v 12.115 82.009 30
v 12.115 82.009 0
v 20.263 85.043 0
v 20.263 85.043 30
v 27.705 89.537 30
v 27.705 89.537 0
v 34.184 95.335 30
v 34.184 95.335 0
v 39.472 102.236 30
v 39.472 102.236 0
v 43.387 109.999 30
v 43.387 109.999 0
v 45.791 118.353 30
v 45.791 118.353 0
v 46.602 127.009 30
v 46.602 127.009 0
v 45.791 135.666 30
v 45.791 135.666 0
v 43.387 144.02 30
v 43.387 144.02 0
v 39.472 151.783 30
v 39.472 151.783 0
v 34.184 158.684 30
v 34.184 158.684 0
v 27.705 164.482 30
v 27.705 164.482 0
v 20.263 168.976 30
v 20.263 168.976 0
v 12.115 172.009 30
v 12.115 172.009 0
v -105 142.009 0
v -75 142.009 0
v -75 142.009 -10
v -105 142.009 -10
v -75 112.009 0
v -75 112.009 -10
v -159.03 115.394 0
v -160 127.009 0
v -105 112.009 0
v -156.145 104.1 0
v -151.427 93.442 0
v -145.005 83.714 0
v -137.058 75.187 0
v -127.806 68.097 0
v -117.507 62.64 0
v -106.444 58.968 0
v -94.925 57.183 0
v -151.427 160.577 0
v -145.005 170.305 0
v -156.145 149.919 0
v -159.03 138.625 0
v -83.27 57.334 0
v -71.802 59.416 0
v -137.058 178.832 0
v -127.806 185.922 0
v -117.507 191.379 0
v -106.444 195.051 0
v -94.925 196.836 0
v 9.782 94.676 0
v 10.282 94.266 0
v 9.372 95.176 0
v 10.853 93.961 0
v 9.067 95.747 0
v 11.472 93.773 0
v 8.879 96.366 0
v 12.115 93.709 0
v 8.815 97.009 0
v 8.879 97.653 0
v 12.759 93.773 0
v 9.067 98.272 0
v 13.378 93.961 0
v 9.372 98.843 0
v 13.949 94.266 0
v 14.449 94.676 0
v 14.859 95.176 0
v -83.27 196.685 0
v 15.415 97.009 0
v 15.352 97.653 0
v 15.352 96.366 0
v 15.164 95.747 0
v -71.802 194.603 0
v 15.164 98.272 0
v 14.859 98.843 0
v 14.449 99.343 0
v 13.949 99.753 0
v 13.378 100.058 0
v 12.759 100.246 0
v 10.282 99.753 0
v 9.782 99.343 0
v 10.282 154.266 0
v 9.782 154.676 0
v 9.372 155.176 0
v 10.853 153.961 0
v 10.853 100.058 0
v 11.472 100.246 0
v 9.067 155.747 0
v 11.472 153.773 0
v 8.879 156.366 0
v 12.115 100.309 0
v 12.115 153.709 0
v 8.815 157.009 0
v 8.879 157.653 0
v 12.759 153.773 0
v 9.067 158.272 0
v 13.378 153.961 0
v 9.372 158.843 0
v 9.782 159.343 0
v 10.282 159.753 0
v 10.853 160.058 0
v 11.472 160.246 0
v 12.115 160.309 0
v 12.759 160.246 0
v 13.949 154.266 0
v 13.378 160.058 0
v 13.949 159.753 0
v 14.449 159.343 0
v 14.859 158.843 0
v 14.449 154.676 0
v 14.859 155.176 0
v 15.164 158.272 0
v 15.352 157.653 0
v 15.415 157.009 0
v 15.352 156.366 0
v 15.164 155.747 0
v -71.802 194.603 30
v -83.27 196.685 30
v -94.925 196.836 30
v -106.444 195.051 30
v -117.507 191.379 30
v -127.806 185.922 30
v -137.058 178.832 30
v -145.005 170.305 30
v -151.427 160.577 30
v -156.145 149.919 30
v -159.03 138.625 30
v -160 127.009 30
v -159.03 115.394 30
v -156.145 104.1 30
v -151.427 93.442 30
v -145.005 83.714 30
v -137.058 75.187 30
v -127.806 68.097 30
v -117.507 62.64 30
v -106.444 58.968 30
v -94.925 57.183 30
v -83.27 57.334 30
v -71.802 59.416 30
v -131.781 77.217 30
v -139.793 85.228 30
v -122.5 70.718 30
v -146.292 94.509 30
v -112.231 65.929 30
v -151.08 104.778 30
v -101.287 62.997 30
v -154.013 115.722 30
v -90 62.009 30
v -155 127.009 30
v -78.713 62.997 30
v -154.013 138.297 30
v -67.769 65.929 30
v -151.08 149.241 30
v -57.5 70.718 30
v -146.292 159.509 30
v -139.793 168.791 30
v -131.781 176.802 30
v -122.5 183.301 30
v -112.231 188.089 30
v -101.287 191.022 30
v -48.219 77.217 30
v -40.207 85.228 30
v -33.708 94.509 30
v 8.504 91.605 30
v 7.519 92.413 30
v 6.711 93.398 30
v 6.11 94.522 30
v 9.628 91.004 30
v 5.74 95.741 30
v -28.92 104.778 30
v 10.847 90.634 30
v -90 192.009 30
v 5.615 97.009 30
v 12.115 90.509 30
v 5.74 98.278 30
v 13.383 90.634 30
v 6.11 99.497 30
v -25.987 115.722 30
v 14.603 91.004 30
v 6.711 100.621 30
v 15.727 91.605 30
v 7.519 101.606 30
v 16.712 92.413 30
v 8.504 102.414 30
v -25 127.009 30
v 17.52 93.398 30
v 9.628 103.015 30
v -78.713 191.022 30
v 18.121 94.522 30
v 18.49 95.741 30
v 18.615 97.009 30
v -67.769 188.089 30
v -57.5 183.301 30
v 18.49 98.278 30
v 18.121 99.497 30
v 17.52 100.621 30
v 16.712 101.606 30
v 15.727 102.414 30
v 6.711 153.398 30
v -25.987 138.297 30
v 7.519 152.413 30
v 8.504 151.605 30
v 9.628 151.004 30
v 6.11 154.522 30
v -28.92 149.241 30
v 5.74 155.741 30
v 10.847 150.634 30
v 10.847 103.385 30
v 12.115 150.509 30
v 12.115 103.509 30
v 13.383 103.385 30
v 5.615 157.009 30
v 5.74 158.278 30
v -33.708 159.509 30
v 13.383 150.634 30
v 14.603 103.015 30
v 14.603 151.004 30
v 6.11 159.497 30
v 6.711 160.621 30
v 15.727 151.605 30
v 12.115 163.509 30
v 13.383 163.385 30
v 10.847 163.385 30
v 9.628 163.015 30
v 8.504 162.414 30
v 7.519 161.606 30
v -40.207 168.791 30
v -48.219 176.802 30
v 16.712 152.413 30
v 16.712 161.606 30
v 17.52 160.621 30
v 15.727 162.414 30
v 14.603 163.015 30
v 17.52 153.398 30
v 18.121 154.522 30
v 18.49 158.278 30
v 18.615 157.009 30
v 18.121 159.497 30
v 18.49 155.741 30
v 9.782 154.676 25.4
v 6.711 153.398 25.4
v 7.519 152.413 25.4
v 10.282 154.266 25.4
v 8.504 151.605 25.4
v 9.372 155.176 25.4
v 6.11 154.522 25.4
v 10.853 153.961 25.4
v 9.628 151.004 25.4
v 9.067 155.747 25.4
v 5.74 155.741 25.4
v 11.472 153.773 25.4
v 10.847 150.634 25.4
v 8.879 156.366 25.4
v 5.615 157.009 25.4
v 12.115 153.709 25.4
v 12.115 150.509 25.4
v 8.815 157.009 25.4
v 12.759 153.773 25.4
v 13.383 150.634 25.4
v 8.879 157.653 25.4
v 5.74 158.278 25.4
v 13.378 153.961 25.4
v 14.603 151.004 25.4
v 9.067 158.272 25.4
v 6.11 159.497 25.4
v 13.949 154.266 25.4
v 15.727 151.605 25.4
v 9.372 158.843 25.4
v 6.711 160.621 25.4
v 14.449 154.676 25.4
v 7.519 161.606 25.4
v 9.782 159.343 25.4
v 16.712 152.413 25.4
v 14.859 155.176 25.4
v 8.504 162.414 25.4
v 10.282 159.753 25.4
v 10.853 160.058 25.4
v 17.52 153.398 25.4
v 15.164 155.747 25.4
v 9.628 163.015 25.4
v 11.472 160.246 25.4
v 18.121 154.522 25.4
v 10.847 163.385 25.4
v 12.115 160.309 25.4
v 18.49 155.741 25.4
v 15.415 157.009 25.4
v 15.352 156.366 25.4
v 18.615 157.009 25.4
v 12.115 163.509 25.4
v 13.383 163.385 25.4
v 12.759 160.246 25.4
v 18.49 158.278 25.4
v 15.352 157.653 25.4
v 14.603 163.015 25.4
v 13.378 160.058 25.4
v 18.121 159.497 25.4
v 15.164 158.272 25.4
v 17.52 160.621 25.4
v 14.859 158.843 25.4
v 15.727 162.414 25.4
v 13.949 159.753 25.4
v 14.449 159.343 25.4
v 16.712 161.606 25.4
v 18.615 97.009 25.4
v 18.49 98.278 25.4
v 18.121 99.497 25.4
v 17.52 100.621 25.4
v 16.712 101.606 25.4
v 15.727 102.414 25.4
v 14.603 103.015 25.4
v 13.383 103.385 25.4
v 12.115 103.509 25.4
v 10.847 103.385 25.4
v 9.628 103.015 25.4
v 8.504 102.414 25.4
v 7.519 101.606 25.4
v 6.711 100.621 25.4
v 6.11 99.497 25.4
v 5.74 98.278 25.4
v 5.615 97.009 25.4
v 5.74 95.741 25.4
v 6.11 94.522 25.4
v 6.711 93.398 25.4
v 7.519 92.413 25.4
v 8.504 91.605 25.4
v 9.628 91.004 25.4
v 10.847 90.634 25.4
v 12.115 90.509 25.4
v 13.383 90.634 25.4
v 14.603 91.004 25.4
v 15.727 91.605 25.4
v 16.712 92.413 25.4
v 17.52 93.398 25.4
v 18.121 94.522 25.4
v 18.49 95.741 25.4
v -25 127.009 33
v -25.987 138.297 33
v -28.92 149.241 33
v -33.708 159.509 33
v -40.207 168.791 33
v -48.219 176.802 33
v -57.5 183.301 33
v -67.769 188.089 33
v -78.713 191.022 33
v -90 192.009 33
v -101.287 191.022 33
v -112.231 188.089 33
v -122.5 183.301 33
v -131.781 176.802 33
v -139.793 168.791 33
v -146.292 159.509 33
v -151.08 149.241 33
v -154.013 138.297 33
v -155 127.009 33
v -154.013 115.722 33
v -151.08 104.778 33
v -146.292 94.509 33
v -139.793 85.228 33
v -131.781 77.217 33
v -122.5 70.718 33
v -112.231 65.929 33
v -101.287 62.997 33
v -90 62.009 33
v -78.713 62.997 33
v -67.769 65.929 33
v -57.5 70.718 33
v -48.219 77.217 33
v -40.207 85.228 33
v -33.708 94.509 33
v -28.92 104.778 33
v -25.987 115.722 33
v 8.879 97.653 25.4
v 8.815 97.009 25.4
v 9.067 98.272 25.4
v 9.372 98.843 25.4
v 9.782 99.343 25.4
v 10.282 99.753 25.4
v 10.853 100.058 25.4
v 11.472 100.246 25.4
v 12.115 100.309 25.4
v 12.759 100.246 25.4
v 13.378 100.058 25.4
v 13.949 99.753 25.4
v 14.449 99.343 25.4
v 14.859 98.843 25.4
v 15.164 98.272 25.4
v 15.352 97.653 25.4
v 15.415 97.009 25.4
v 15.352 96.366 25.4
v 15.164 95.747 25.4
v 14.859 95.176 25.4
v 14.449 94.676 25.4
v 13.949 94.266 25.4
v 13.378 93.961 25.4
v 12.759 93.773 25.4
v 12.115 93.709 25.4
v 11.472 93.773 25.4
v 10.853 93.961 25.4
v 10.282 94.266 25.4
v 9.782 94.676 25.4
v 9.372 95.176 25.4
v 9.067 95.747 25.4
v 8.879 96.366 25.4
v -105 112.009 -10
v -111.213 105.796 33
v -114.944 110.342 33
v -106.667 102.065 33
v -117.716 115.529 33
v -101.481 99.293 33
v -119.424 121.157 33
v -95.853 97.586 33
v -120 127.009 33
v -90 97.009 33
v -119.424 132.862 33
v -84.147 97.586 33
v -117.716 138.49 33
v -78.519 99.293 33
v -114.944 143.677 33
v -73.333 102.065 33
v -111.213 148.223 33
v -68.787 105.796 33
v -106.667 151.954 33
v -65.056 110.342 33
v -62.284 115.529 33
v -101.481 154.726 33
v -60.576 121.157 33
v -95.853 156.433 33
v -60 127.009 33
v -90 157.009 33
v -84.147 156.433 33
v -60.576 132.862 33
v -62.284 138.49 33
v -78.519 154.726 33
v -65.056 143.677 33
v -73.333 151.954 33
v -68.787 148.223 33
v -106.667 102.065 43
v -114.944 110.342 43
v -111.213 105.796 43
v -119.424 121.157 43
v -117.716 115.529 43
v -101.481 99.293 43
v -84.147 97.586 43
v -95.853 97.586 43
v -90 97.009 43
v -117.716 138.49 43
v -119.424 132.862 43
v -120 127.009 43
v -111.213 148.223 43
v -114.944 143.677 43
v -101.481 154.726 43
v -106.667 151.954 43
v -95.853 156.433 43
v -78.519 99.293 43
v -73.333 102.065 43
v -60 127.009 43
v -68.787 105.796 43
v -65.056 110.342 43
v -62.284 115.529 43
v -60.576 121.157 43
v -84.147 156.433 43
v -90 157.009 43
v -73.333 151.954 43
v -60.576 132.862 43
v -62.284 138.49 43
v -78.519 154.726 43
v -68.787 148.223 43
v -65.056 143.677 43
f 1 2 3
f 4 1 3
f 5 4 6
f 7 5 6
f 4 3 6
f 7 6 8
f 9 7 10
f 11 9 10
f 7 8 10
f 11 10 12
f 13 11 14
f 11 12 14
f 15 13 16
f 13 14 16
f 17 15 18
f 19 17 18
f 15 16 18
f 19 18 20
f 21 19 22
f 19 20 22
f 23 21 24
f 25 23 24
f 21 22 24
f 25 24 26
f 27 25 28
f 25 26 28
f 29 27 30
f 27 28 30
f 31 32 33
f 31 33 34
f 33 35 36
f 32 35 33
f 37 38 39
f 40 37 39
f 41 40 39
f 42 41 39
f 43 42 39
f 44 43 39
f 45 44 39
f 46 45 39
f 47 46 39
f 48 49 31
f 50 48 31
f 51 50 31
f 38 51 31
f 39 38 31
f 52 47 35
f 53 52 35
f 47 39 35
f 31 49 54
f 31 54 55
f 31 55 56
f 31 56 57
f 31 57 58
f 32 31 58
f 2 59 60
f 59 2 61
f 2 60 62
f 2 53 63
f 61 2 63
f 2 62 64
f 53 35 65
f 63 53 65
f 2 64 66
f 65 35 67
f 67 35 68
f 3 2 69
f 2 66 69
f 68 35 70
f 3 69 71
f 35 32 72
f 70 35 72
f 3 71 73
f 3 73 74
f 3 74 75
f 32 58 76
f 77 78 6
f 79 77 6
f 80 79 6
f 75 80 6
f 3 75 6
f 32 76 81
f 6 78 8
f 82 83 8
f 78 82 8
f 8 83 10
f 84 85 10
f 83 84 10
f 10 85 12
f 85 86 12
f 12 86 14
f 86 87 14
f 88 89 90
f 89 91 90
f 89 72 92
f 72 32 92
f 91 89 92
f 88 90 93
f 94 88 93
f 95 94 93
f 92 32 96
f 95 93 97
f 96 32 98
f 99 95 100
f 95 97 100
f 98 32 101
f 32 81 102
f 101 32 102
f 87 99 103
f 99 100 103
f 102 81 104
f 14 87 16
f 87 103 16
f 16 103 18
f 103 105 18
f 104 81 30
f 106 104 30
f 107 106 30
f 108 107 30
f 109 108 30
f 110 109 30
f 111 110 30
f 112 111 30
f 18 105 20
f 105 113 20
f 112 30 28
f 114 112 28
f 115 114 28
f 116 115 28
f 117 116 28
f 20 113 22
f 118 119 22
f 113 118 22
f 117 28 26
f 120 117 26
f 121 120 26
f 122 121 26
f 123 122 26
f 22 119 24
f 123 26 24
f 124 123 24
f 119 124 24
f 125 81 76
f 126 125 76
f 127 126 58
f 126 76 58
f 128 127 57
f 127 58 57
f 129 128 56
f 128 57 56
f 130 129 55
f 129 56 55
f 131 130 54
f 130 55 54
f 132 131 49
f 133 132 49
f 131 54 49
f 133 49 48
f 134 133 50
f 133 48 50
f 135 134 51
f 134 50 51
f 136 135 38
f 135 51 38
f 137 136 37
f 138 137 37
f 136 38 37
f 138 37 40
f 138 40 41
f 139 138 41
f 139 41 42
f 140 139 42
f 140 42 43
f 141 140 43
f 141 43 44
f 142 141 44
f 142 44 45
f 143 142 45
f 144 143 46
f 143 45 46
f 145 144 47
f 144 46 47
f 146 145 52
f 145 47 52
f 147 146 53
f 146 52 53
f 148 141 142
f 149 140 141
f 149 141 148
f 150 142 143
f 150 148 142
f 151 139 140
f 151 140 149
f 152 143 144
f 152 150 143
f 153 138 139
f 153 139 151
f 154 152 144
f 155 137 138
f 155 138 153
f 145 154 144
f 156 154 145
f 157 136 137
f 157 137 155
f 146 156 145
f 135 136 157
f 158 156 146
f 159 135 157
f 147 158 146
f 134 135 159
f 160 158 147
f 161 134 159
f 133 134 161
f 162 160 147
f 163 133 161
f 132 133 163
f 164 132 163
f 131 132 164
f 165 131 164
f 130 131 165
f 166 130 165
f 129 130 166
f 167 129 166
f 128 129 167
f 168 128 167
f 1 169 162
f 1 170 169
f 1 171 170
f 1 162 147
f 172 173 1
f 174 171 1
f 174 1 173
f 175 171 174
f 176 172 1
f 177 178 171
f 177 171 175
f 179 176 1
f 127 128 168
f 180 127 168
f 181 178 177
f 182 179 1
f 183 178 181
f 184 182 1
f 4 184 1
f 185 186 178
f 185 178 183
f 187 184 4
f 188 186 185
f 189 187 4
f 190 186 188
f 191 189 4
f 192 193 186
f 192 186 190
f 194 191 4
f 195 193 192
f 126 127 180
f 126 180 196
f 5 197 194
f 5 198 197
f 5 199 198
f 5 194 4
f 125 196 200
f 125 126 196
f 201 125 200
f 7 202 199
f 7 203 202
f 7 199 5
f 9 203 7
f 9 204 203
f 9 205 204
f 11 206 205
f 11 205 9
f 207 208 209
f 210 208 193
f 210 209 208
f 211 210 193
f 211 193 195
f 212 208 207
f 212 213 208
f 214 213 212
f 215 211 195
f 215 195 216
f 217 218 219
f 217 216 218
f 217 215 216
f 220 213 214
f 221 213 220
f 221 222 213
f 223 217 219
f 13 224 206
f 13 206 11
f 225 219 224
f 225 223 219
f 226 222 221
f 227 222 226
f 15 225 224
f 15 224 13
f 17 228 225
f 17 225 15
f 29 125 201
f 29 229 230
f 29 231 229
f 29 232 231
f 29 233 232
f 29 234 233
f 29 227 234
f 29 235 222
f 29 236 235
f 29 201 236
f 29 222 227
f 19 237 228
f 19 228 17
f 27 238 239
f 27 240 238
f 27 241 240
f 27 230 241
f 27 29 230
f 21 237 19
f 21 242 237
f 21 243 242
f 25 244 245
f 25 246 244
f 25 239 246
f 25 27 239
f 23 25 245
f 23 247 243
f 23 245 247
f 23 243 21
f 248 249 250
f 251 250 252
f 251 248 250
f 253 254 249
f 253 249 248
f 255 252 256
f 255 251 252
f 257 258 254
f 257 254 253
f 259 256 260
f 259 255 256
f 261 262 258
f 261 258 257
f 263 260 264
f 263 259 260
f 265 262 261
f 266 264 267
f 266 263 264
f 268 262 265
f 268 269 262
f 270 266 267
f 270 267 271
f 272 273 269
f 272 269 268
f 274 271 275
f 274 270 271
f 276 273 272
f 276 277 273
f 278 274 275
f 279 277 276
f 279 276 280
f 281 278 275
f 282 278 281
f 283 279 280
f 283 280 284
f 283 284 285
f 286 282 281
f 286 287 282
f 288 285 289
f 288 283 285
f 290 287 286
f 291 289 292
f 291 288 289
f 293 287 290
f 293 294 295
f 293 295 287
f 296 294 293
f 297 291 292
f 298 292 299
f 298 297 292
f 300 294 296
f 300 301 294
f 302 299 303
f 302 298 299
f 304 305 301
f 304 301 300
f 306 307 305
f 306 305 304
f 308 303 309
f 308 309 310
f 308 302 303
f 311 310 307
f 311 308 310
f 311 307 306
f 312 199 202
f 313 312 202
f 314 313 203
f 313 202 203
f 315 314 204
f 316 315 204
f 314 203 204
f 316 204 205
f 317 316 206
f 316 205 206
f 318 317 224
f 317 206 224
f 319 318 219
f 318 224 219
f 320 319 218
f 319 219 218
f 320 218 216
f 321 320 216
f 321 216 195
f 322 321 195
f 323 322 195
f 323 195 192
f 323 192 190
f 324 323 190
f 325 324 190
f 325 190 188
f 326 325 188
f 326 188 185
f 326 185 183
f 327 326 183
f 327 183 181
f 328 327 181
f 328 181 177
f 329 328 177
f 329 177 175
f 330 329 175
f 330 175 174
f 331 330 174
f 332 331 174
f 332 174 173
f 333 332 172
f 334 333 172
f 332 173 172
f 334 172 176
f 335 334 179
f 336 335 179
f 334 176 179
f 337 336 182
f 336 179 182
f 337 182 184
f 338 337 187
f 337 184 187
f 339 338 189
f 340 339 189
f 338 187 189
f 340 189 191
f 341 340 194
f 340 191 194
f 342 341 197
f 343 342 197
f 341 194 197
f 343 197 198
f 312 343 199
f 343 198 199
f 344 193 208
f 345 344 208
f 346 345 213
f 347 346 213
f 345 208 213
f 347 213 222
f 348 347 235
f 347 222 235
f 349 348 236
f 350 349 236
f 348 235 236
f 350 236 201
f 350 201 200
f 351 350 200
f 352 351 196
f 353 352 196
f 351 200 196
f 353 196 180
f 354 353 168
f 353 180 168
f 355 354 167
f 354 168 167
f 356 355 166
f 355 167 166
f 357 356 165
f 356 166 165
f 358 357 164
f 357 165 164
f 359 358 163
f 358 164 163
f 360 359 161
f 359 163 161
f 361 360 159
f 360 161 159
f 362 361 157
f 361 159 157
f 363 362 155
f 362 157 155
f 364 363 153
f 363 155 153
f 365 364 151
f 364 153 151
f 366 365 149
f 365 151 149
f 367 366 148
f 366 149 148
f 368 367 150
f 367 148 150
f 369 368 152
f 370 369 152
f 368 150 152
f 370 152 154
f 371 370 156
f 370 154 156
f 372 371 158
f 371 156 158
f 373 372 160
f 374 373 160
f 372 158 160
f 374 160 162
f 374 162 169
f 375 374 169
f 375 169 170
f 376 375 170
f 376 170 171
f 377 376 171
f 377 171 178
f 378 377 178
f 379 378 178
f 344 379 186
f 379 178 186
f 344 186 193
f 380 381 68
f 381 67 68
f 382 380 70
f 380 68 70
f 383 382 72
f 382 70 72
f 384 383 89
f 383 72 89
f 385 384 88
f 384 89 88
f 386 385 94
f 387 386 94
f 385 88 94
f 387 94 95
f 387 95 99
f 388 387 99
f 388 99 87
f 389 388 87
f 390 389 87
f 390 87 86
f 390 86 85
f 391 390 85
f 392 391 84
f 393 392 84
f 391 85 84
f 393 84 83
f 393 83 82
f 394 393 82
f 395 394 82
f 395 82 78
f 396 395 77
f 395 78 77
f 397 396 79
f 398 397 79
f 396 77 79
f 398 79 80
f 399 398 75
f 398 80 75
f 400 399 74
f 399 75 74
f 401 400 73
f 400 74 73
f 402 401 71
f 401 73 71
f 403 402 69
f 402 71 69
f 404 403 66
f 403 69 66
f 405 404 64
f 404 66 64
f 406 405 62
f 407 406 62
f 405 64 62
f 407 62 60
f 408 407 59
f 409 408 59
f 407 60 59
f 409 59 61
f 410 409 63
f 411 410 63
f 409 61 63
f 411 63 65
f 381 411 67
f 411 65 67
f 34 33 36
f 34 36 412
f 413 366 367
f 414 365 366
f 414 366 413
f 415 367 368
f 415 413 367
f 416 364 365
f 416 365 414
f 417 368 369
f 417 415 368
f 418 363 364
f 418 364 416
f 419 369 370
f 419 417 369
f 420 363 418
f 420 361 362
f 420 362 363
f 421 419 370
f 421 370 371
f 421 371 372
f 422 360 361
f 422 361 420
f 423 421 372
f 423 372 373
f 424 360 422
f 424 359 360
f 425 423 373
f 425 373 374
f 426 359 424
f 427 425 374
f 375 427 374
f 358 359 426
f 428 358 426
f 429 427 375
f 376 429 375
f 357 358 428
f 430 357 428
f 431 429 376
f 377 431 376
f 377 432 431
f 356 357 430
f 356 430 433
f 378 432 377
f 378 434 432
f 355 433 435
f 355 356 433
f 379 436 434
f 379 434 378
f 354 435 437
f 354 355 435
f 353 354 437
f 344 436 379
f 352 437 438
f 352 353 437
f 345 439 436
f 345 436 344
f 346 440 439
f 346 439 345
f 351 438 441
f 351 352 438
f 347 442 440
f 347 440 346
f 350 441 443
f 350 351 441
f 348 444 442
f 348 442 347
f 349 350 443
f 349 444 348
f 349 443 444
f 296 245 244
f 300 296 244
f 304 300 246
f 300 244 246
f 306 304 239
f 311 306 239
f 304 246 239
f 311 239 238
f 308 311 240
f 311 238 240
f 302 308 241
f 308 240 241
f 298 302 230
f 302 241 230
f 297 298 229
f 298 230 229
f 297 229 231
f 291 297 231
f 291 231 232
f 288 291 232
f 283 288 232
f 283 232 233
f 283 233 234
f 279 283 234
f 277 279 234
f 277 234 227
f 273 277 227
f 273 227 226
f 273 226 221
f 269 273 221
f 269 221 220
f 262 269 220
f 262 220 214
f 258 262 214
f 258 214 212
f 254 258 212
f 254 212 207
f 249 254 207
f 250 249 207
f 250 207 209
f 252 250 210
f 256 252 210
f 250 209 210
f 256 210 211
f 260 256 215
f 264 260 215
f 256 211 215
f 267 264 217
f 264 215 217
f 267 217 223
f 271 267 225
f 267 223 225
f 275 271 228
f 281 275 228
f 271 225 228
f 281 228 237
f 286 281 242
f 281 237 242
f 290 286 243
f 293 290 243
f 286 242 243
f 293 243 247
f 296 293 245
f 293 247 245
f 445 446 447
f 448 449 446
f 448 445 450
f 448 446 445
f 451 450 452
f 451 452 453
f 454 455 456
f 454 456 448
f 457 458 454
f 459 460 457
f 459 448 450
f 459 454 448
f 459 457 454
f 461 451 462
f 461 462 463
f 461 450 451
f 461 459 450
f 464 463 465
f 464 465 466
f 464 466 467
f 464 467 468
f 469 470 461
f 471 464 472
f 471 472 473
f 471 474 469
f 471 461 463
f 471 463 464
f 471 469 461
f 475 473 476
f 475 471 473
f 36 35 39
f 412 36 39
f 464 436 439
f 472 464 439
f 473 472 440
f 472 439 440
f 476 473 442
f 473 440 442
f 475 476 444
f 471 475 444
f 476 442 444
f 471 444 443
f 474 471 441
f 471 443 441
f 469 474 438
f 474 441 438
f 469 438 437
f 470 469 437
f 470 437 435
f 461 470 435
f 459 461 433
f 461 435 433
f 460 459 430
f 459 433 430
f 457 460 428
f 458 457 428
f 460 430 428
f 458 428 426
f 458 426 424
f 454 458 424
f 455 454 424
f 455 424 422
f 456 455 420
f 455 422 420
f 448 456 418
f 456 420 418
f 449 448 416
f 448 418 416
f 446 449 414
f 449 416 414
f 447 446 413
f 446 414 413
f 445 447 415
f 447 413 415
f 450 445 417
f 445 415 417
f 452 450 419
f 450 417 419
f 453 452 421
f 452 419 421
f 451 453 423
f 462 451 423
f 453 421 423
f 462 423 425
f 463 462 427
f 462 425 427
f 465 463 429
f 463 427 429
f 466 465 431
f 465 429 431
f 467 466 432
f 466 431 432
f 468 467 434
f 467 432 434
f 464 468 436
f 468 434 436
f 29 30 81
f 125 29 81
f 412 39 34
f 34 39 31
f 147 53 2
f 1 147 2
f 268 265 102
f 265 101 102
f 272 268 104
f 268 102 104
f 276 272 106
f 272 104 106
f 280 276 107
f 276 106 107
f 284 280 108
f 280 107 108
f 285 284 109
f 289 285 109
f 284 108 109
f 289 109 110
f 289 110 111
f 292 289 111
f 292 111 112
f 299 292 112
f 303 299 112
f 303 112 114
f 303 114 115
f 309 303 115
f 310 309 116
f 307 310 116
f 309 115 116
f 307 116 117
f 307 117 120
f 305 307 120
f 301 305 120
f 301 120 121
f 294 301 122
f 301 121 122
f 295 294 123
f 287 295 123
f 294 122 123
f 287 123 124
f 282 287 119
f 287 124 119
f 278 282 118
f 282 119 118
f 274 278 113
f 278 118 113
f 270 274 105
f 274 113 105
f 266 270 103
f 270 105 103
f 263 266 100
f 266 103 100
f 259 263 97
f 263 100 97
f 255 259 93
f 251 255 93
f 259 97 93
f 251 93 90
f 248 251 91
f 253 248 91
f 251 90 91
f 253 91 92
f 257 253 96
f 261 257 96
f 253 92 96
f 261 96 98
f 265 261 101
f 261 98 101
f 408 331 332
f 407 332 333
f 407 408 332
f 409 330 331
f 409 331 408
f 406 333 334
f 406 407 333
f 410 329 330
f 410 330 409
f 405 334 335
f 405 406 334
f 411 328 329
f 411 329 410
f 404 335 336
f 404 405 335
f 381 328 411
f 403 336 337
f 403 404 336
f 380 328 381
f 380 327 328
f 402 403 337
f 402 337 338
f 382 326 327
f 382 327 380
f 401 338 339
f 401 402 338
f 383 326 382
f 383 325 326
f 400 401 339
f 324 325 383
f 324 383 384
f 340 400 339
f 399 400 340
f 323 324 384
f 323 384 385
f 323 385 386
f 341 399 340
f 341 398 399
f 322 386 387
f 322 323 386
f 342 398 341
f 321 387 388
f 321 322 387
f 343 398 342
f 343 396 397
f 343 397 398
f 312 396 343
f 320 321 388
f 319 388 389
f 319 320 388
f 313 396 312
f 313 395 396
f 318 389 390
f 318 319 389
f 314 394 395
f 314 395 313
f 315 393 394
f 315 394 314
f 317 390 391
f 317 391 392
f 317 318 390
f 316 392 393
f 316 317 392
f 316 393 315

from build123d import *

# Parameters (mm, degrees)
BOSS_EXTRUDE1_DEPTH                      = 30
SKETCH2_W                                = 30
SKETCH2_H                                = 30
BOSS_EXTRUDE2_DEPTH                      = 10
SKETCH3_R                                = 65
BOSS_EXTRUDE3_DEPTH                      = 3
SKETCH4_R                                = 30
BOSS_EXTRUDE4_DEPTH                      = 10
CBORE_FOR_M6_PAN_HEAD_SCREW1_D           = 6.6
CBORE_FOR_M6_PAN_HEAD_SCREW1_DEPTH       = 50.5
CBORE_FOR_M6_PAN_HEAD_SCREW1_CBORE_D     = 13
CBORE_FOR_M6_PAN_HEAD_SCREW1_CBORE_DEPTH = 4.6
CBORE_FOR_M6_PAN_HEAD_SCREW1_TIP         = 1.982840043


with BuildPart() as part:
    # Sketch1 → Boss-Extrude1 (new body)
    with BuildSketch(Plane.XY):
        with BuildLine():
            Line((12.115384439, 172.009473486), (-71.801857106, 194.602576649))
            ThreePointArc((-71.801857106, 194.602576649), (-160, 127.009473486), (-71.801857106, 59.416370323))
            Line((-71.801857106, 59.416370323), (12.115384439, 82.009473486))
            ThreePointArc((12.115384439, 82.009473486), (46.602387708, 127.009473486), (12.115384439, 172.009473486))
        make_face()
    extrude(amount=BOSS_EXTRUDE1_DEPTH)

    # Sketch2 → Boss-Extrude2 (add)
    with BuildSketch(Plane(origin=(0, 0, 0), x_dir=(-1, 0, 0), z_dir=(0, 0, -1))):
        with Locations((90, 127.009473486)):
            Rectangle(SKETCH2_W, SKETCH2_H)
    extrude(amount=BOSS_EXTRUDE2_DEPTH)

    # Sketch3 → Boss-Extrude3 (add)
    with BuildSketch(Plane.XY.offset(30)):
        with Locations((-90, 127.009473486)):
            Circle(SKETCH3_R)
    extrude(amount=BOSS_EXTRUDE3_DEPTH)

    # Sketch4 → Boss-Extrude4 (add)
    with BuildSketch(Plane.XY.offset(33)):
        with Locations((-90, 127.009473486)):
            Circle(SKETCH4_R)
    extrude(amount=BOSS_EXTRUDE4_DEPTH)

    # CBORE for M6 Pan Head Screw1
    with Locations(Plane(origin=(12.115384439, 157.009473486, 30), x_dir=(1, 0, 0), z_dir=(0, 0, 1))):
        with Locations((0, 0), (0, -60)):
            CounterBoreHole(CBORE_FOR_M6_PAN_HEAD_SCREW1_D / 2, CBORE_FOR_M6_PAN_HEAD_SCREW1_CBORE_D / 2, CBORE_FOR_M6_PAN_HEAD_SCREW1_CBORE_DEPTH, depth=CBORE_FOR_M6_PAN_HEAD_SCREW1_DEPTH)
            with Locations((0, 0, -(CBORE_FOR_M6_PAN_HEAD_SCREW1_DEPTH + CBORE_FOR_M6_PAN_HEAD_SCREW1_TIP / 2))):  # 118° drill point
                Cone(0, CBORE_FOR_M6_PAN_HEAD_SCREW1_D / 2, CBORE_FOR_M6_PAN_HEAD_SCREW1_TIP, mode=Mode.SUBTRACT)


solid = part.part
